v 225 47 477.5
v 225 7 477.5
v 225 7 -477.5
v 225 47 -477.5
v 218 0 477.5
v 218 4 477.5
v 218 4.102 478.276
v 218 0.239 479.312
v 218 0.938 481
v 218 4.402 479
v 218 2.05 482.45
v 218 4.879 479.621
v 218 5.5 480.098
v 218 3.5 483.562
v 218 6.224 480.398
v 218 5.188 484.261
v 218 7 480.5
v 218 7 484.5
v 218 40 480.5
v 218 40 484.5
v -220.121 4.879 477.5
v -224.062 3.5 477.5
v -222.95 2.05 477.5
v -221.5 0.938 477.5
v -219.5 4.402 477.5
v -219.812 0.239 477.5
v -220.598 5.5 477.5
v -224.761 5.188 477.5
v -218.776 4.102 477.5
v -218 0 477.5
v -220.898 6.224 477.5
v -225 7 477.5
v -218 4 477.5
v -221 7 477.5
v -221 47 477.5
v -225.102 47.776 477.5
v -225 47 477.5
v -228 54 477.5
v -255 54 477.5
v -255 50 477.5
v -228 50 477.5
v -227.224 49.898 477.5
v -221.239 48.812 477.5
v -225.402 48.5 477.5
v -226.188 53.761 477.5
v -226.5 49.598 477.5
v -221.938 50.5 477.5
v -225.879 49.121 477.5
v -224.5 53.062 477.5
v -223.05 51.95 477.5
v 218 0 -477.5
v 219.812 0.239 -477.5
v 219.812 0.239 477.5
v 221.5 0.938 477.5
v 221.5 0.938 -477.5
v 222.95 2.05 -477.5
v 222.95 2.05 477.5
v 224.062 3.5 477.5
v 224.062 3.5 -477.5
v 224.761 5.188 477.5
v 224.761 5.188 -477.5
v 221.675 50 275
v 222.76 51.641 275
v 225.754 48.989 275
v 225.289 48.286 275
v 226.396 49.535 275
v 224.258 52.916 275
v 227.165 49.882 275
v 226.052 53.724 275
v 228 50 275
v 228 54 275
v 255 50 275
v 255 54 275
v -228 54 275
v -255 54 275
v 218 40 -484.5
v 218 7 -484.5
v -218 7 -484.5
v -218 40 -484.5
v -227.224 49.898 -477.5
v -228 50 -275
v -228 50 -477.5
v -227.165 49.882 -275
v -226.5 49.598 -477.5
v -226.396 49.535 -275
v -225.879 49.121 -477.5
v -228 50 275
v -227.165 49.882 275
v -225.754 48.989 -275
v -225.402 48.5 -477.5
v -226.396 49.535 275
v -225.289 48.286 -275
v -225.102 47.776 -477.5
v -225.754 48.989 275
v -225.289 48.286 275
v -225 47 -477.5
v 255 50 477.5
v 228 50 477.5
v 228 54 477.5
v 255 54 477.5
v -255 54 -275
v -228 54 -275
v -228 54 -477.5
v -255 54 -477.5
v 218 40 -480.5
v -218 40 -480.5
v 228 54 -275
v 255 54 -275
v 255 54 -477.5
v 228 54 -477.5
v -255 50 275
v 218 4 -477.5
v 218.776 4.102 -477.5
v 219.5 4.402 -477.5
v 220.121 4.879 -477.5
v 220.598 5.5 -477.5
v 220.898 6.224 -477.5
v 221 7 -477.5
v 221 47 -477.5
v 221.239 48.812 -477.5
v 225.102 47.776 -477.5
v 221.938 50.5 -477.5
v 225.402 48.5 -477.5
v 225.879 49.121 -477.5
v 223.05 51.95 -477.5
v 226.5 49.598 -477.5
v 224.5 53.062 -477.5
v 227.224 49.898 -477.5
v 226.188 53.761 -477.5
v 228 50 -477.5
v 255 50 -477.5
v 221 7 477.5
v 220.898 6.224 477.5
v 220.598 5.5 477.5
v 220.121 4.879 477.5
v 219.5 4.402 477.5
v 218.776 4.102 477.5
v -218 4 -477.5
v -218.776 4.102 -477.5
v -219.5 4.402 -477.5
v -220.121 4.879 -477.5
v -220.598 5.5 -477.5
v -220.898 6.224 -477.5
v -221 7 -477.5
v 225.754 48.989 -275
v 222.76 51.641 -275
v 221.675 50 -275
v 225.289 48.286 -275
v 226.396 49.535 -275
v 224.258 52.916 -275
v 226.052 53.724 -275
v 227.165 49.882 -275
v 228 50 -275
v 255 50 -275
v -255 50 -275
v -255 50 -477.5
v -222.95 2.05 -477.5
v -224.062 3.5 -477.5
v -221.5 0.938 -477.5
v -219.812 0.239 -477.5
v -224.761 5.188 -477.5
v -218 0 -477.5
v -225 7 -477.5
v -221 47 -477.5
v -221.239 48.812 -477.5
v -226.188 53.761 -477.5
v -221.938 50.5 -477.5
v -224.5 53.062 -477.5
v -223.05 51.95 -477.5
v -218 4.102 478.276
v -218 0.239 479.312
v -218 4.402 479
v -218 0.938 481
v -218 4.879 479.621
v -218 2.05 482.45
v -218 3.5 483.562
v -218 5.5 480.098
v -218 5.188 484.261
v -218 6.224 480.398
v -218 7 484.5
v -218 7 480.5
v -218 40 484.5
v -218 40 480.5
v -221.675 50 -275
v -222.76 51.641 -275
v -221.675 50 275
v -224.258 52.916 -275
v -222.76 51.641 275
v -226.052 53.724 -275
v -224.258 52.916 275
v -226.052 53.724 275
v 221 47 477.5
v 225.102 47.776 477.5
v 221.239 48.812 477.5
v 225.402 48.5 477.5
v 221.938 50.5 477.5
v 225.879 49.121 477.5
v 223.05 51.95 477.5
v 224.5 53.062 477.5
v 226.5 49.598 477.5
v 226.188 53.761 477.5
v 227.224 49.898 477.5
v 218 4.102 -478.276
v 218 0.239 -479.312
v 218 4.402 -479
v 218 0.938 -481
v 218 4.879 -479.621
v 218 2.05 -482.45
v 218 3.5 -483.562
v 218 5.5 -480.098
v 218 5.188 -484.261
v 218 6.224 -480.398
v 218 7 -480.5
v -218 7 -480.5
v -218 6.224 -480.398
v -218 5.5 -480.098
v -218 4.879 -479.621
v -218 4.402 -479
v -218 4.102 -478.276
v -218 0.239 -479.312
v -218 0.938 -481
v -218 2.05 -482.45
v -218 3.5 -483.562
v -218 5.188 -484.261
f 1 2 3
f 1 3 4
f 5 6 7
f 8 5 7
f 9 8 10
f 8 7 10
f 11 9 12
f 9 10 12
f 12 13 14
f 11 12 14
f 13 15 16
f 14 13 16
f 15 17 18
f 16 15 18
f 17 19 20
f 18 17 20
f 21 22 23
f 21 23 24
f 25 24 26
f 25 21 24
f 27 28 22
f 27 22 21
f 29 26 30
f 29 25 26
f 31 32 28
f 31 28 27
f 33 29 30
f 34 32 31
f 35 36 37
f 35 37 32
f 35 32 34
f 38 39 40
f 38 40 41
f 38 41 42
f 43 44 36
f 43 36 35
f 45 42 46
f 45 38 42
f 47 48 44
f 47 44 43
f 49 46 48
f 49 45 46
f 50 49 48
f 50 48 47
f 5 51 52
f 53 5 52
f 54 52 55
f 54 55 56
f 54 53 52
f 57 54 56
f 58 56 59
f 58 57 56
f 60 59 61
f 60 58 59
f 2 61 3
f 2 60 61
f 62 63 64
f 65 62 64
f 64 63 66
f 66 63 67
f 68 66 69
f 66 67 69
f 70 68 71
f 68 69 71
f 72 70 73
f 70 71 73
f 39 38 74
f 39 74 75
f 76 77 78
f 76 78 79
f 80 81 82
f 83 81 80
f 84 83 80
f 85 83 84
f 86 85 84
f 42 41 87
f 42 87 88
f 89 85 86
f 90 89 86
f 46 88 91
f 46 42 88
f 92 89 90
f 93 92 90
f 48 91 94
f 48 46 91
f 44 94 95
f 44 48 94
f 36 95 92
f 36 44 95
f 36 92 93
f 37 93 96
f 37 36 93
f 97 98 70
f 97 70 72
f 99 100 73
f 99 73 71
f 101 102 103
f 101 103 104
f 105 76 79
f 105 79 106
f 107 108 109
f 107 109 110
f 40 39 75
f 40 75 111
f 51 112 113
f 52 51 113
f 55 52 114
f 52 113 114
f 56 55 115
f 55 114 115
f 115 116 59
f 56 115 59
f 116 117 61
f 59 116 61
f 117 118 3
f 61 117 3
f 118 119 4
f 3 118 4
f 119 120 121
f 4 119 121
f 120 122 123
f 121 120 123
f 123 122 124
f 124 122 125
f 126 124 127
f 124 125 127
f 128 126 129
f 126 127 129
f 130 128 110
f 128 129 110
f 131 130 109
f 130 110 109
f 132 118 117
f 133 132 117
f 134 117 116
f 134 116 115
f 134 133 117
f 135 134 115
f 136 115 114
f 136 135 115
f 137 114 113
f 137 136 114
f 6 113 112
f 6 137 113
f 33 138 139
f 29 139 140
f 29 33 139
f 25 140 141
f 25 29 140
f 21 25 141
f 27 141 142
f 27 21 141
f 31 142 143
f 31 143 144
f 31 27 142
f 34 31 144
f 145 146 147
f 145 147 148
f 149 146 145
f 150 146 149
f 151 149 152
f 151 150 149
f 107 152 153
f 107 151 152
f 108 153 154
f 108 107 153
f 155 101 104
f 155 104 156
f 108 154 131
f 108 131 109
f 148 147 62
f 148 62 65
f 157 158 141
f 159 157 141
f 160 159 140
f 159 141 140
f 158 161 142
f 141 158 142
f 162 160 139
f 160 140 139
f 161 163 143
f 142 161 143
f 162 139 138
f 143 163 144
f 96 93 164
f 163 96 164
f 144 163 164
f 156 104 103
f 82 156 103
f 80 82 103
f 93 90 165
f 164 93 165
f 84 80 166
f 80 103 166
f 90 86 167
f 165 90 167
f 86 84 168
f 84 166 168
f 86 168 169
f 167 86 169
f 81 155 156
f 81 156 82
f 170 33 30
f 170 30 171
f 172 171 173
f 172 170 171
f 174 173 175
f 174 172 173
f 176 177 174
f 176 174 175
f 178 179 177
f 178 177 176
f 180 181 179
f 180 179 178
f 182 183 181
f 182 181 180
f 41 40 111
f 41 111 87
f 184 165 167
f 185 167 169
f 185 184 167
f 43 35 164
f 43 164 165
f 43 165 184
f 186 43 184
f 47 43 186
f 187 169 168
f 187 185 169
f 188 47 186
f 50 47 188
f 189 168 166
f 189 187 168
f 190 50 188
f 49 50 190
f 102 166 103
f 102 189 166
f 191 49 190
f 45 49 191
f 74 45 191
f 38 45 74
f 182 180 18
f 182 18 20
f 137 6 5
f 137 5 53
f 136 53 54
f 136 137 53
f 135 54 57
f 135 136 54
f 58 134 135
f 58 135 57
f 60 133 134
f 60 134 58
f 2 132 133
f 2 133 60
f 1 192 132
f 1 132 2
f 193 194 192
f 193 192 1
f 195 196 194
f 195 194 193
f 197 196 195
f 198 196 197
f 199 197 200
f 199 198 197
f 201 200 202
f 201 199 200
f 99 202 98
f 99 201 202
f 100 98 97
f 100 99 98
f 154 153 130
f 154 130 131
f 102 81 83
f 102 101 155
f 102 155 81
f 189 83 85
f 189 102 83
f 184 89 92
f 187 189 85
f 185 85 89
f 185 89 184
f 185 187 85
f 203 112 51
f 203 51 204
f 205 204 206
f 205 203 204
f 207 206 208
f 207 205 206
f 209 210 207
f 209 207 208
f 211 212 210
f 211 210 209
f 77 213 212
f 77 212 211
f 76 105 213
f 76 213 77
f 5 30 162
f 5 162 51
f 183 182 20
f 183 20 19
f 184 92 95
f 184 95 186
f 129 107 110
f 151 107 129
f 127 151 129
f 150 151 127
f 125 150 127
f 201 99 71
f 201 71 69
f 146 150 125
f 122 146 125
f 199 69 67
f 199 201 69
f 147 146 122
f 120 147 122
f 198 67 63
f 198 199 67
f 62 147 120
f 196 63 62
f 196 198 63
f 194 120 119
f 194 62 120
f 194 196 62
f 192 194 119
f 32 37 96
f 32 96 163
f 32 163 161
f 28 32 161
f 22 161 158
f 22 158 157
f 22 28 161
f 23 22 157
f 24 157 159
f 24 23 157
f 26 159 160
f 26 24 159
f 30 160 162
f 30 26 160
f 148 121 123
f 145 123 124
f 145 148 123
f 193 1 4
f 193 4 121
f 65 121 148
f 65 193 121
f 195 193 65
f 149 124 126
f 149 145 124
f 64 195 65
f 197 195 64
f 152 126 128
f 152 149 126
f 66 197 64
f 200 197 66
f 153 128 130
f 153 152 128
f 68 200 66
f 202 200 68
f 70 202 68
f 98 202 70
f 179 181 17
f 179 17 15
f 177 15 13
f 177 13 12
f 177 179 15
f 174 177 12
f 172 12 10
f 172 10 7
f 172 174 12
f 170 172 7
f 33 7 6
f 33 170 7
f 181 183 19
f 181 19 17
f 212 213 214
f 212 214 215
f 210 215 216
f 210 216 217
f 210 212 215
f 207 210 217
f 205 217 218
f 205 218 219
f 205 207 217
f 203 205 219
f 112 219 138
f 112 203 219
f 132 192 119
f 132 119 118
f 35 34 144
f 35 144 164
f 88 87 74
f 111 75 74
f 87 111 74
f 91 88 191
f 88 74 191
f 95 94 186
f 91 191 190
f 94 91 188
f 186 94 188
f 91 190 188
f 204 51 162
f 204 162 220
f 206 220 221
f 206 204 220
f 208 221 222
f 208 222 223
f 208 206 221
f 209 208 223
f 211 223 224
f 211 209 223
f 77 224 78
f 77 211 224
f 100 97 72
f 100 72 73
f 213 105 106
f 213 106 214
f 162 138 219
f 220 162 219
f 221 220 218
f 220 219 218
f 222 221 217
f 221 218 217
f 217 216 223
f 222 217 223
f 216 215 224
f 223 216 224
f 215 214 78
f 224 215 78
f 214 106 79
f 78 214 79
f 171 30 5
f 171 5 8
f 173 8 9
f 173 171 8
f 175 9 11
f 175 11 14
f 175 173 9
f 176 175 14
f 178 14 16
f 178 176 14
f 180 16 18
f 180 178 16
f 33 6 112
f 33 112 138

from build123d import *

# Parameters (mm, degrees)
BASE_FLANGIA1_DEPTH       = 477.5
BORDO_FLANGIA1_DEPTH      = 436
BORDO_FLANGIA1_BEND_DEPTH = 436
TAGLIO_ESTRUSIONE2_START  = -275
TAGLIO_ESTRUSIONE2_DEPTH  = 550


# Read off the part's stored shape, not the designer's step: Taglio-Estrusione2
# Sheet-metal steps are written as plain solids
with BuildPart() as part:
    # Schizzo1 → Base-Flangia1 (new, symmetric)
    with BuildSketch(Plane.XY):
        with BuildLine():
            Line((-255, 50), (-228, 50))
            ThreePointArc((-228, 50), (-225.878679656, 49.121320344), (-225, 47))
            Line((-225, 47), (-225, 7))
            ThreePointArc((-225, 7), (-222.949747468, 2.050252532), (-218, 0))
            Line((-218, 0), (218, 0))
            ThreePointArc((218, 0), (222.949747468, 2.050252532), (225, 7))
            Line((225, 7), (225, 47))
            ThreePointArc((225, 47), (225.878679656, 49.121320344), (228, 50))
            Line((228, 50), (255, 50))
            Line((255, 50), (255, 54))
            Line((255, 54), (228, 54))
            ThreePointArc((228, 54), (223.050252532, 51.949747468), (221, 47))
            Line((221, 47), (221, 7))
            ThreePointArc((221, 7), (220.121320344, 4.878679656), (218, 4))
            Line((218, 4), (-218, 4))
            ThreePointArc((-218, 4), (-220.121320344, 4.878679656), (-221, 7))
            Line((-221, 7), (-221, 47))
            ThreePointArc((-221, 47), (-223.050252532, 51.949747468), (-228, 54))
            Line((-228, 54), (-255, 54))
            Line((-255, 54), (-255, 50))
        make_face()
    extrude(amount=BASE_FLANGIA1_DEPTH, both=True)

    # Bordo-Flangia1 section (across the edge) → Bordo-Flangia1 (add)
    with BuildSketch(Plane(origin=(-218, 4, 480.5), x_dir=(0, 0, -1), z_dir=(1, 0, 0))):
        with BuildLine():
            Line((-4, 3), (-4, 36))
            Line((-4, 36), (0, 36))
            Line((0, 36), (0, 3))
            ThreePointArc((0, 3), (0.878679656, 0.878679656), (3, 0))
            Line((3, 0), (3, -4))
            ThreePointArc((3, -4), (-1.949747468, -1.949747468), (-4, 3))
        make_face()
    extrude(amount=BORDO_FLANGIA1_DEPTH)

    # Bordo-Flangia1 section 2 (across the edge) → Bordo-Flangia1 bend (add)
    with BuildSketch(Plane(origin=(218, 4, -480.5), x_dir=(0, 0, 1), z_dir=(-1, 0, 0))):
        with BuildLine():
            Line((-4, 3), (-4, 36))
            Line((-4, 36), (0, 36))
            Line((0, 36), (0, 3))
            ThreePointArc((0, 3), (0.878679656, 0.878679656), (3, 0))
            Line((3, 0), (3, -4))
            ThreePointArc((3, -4), (-1.949747468, -1.949747468), (-4, 3))
        make_face()
    extrude(amount=BORDO_FLANGIA1_BEND_DEPTH)

    # Taglio-Estrusione2 outline → Taglio-Estrusione2 (cut)
    with BuildSketch(Plane.XY.offset(TAGLIO_ESTRUSIONE2_START)):
        with BuildLine():
            ThreePointArc((-228, 50), (-226.396432548, 49.535462765), (-225.289476291, 48.285714286))
            Line((-225.289476291, 48.285714286), (-221.67544468, 50))
            ThreePointArc((-221.67544468, 50), (-224.258342614, 52.916079783), (-228, 54))
            Line((-228, 54), (-255, 54))
            Line((-255, 54), (-255, 50))
            Line((-255, 50), (-228, 50))
        make_face()
        with BuildLine():
            ThreePointArc((228, 54), (224.258342614, 52.916079783), (221.67544468, 50))
            Line((221.67544468, 50), (225.289476291, 48.285714286))
            ThreePointArc((225.289476291, 48.285714286), (226.396432548, 49.535462765), (228, 50))
            Line((228, 50), (255, 50))
            Line((255, 50), (255, 54))
            Line((255, 54), (228, 54))
        make_face()
    extrude(amount=TAGLIO_ESTRUSIONE2_DEPTH, mode=Mode.SUBTRACT)


solid = part.part
